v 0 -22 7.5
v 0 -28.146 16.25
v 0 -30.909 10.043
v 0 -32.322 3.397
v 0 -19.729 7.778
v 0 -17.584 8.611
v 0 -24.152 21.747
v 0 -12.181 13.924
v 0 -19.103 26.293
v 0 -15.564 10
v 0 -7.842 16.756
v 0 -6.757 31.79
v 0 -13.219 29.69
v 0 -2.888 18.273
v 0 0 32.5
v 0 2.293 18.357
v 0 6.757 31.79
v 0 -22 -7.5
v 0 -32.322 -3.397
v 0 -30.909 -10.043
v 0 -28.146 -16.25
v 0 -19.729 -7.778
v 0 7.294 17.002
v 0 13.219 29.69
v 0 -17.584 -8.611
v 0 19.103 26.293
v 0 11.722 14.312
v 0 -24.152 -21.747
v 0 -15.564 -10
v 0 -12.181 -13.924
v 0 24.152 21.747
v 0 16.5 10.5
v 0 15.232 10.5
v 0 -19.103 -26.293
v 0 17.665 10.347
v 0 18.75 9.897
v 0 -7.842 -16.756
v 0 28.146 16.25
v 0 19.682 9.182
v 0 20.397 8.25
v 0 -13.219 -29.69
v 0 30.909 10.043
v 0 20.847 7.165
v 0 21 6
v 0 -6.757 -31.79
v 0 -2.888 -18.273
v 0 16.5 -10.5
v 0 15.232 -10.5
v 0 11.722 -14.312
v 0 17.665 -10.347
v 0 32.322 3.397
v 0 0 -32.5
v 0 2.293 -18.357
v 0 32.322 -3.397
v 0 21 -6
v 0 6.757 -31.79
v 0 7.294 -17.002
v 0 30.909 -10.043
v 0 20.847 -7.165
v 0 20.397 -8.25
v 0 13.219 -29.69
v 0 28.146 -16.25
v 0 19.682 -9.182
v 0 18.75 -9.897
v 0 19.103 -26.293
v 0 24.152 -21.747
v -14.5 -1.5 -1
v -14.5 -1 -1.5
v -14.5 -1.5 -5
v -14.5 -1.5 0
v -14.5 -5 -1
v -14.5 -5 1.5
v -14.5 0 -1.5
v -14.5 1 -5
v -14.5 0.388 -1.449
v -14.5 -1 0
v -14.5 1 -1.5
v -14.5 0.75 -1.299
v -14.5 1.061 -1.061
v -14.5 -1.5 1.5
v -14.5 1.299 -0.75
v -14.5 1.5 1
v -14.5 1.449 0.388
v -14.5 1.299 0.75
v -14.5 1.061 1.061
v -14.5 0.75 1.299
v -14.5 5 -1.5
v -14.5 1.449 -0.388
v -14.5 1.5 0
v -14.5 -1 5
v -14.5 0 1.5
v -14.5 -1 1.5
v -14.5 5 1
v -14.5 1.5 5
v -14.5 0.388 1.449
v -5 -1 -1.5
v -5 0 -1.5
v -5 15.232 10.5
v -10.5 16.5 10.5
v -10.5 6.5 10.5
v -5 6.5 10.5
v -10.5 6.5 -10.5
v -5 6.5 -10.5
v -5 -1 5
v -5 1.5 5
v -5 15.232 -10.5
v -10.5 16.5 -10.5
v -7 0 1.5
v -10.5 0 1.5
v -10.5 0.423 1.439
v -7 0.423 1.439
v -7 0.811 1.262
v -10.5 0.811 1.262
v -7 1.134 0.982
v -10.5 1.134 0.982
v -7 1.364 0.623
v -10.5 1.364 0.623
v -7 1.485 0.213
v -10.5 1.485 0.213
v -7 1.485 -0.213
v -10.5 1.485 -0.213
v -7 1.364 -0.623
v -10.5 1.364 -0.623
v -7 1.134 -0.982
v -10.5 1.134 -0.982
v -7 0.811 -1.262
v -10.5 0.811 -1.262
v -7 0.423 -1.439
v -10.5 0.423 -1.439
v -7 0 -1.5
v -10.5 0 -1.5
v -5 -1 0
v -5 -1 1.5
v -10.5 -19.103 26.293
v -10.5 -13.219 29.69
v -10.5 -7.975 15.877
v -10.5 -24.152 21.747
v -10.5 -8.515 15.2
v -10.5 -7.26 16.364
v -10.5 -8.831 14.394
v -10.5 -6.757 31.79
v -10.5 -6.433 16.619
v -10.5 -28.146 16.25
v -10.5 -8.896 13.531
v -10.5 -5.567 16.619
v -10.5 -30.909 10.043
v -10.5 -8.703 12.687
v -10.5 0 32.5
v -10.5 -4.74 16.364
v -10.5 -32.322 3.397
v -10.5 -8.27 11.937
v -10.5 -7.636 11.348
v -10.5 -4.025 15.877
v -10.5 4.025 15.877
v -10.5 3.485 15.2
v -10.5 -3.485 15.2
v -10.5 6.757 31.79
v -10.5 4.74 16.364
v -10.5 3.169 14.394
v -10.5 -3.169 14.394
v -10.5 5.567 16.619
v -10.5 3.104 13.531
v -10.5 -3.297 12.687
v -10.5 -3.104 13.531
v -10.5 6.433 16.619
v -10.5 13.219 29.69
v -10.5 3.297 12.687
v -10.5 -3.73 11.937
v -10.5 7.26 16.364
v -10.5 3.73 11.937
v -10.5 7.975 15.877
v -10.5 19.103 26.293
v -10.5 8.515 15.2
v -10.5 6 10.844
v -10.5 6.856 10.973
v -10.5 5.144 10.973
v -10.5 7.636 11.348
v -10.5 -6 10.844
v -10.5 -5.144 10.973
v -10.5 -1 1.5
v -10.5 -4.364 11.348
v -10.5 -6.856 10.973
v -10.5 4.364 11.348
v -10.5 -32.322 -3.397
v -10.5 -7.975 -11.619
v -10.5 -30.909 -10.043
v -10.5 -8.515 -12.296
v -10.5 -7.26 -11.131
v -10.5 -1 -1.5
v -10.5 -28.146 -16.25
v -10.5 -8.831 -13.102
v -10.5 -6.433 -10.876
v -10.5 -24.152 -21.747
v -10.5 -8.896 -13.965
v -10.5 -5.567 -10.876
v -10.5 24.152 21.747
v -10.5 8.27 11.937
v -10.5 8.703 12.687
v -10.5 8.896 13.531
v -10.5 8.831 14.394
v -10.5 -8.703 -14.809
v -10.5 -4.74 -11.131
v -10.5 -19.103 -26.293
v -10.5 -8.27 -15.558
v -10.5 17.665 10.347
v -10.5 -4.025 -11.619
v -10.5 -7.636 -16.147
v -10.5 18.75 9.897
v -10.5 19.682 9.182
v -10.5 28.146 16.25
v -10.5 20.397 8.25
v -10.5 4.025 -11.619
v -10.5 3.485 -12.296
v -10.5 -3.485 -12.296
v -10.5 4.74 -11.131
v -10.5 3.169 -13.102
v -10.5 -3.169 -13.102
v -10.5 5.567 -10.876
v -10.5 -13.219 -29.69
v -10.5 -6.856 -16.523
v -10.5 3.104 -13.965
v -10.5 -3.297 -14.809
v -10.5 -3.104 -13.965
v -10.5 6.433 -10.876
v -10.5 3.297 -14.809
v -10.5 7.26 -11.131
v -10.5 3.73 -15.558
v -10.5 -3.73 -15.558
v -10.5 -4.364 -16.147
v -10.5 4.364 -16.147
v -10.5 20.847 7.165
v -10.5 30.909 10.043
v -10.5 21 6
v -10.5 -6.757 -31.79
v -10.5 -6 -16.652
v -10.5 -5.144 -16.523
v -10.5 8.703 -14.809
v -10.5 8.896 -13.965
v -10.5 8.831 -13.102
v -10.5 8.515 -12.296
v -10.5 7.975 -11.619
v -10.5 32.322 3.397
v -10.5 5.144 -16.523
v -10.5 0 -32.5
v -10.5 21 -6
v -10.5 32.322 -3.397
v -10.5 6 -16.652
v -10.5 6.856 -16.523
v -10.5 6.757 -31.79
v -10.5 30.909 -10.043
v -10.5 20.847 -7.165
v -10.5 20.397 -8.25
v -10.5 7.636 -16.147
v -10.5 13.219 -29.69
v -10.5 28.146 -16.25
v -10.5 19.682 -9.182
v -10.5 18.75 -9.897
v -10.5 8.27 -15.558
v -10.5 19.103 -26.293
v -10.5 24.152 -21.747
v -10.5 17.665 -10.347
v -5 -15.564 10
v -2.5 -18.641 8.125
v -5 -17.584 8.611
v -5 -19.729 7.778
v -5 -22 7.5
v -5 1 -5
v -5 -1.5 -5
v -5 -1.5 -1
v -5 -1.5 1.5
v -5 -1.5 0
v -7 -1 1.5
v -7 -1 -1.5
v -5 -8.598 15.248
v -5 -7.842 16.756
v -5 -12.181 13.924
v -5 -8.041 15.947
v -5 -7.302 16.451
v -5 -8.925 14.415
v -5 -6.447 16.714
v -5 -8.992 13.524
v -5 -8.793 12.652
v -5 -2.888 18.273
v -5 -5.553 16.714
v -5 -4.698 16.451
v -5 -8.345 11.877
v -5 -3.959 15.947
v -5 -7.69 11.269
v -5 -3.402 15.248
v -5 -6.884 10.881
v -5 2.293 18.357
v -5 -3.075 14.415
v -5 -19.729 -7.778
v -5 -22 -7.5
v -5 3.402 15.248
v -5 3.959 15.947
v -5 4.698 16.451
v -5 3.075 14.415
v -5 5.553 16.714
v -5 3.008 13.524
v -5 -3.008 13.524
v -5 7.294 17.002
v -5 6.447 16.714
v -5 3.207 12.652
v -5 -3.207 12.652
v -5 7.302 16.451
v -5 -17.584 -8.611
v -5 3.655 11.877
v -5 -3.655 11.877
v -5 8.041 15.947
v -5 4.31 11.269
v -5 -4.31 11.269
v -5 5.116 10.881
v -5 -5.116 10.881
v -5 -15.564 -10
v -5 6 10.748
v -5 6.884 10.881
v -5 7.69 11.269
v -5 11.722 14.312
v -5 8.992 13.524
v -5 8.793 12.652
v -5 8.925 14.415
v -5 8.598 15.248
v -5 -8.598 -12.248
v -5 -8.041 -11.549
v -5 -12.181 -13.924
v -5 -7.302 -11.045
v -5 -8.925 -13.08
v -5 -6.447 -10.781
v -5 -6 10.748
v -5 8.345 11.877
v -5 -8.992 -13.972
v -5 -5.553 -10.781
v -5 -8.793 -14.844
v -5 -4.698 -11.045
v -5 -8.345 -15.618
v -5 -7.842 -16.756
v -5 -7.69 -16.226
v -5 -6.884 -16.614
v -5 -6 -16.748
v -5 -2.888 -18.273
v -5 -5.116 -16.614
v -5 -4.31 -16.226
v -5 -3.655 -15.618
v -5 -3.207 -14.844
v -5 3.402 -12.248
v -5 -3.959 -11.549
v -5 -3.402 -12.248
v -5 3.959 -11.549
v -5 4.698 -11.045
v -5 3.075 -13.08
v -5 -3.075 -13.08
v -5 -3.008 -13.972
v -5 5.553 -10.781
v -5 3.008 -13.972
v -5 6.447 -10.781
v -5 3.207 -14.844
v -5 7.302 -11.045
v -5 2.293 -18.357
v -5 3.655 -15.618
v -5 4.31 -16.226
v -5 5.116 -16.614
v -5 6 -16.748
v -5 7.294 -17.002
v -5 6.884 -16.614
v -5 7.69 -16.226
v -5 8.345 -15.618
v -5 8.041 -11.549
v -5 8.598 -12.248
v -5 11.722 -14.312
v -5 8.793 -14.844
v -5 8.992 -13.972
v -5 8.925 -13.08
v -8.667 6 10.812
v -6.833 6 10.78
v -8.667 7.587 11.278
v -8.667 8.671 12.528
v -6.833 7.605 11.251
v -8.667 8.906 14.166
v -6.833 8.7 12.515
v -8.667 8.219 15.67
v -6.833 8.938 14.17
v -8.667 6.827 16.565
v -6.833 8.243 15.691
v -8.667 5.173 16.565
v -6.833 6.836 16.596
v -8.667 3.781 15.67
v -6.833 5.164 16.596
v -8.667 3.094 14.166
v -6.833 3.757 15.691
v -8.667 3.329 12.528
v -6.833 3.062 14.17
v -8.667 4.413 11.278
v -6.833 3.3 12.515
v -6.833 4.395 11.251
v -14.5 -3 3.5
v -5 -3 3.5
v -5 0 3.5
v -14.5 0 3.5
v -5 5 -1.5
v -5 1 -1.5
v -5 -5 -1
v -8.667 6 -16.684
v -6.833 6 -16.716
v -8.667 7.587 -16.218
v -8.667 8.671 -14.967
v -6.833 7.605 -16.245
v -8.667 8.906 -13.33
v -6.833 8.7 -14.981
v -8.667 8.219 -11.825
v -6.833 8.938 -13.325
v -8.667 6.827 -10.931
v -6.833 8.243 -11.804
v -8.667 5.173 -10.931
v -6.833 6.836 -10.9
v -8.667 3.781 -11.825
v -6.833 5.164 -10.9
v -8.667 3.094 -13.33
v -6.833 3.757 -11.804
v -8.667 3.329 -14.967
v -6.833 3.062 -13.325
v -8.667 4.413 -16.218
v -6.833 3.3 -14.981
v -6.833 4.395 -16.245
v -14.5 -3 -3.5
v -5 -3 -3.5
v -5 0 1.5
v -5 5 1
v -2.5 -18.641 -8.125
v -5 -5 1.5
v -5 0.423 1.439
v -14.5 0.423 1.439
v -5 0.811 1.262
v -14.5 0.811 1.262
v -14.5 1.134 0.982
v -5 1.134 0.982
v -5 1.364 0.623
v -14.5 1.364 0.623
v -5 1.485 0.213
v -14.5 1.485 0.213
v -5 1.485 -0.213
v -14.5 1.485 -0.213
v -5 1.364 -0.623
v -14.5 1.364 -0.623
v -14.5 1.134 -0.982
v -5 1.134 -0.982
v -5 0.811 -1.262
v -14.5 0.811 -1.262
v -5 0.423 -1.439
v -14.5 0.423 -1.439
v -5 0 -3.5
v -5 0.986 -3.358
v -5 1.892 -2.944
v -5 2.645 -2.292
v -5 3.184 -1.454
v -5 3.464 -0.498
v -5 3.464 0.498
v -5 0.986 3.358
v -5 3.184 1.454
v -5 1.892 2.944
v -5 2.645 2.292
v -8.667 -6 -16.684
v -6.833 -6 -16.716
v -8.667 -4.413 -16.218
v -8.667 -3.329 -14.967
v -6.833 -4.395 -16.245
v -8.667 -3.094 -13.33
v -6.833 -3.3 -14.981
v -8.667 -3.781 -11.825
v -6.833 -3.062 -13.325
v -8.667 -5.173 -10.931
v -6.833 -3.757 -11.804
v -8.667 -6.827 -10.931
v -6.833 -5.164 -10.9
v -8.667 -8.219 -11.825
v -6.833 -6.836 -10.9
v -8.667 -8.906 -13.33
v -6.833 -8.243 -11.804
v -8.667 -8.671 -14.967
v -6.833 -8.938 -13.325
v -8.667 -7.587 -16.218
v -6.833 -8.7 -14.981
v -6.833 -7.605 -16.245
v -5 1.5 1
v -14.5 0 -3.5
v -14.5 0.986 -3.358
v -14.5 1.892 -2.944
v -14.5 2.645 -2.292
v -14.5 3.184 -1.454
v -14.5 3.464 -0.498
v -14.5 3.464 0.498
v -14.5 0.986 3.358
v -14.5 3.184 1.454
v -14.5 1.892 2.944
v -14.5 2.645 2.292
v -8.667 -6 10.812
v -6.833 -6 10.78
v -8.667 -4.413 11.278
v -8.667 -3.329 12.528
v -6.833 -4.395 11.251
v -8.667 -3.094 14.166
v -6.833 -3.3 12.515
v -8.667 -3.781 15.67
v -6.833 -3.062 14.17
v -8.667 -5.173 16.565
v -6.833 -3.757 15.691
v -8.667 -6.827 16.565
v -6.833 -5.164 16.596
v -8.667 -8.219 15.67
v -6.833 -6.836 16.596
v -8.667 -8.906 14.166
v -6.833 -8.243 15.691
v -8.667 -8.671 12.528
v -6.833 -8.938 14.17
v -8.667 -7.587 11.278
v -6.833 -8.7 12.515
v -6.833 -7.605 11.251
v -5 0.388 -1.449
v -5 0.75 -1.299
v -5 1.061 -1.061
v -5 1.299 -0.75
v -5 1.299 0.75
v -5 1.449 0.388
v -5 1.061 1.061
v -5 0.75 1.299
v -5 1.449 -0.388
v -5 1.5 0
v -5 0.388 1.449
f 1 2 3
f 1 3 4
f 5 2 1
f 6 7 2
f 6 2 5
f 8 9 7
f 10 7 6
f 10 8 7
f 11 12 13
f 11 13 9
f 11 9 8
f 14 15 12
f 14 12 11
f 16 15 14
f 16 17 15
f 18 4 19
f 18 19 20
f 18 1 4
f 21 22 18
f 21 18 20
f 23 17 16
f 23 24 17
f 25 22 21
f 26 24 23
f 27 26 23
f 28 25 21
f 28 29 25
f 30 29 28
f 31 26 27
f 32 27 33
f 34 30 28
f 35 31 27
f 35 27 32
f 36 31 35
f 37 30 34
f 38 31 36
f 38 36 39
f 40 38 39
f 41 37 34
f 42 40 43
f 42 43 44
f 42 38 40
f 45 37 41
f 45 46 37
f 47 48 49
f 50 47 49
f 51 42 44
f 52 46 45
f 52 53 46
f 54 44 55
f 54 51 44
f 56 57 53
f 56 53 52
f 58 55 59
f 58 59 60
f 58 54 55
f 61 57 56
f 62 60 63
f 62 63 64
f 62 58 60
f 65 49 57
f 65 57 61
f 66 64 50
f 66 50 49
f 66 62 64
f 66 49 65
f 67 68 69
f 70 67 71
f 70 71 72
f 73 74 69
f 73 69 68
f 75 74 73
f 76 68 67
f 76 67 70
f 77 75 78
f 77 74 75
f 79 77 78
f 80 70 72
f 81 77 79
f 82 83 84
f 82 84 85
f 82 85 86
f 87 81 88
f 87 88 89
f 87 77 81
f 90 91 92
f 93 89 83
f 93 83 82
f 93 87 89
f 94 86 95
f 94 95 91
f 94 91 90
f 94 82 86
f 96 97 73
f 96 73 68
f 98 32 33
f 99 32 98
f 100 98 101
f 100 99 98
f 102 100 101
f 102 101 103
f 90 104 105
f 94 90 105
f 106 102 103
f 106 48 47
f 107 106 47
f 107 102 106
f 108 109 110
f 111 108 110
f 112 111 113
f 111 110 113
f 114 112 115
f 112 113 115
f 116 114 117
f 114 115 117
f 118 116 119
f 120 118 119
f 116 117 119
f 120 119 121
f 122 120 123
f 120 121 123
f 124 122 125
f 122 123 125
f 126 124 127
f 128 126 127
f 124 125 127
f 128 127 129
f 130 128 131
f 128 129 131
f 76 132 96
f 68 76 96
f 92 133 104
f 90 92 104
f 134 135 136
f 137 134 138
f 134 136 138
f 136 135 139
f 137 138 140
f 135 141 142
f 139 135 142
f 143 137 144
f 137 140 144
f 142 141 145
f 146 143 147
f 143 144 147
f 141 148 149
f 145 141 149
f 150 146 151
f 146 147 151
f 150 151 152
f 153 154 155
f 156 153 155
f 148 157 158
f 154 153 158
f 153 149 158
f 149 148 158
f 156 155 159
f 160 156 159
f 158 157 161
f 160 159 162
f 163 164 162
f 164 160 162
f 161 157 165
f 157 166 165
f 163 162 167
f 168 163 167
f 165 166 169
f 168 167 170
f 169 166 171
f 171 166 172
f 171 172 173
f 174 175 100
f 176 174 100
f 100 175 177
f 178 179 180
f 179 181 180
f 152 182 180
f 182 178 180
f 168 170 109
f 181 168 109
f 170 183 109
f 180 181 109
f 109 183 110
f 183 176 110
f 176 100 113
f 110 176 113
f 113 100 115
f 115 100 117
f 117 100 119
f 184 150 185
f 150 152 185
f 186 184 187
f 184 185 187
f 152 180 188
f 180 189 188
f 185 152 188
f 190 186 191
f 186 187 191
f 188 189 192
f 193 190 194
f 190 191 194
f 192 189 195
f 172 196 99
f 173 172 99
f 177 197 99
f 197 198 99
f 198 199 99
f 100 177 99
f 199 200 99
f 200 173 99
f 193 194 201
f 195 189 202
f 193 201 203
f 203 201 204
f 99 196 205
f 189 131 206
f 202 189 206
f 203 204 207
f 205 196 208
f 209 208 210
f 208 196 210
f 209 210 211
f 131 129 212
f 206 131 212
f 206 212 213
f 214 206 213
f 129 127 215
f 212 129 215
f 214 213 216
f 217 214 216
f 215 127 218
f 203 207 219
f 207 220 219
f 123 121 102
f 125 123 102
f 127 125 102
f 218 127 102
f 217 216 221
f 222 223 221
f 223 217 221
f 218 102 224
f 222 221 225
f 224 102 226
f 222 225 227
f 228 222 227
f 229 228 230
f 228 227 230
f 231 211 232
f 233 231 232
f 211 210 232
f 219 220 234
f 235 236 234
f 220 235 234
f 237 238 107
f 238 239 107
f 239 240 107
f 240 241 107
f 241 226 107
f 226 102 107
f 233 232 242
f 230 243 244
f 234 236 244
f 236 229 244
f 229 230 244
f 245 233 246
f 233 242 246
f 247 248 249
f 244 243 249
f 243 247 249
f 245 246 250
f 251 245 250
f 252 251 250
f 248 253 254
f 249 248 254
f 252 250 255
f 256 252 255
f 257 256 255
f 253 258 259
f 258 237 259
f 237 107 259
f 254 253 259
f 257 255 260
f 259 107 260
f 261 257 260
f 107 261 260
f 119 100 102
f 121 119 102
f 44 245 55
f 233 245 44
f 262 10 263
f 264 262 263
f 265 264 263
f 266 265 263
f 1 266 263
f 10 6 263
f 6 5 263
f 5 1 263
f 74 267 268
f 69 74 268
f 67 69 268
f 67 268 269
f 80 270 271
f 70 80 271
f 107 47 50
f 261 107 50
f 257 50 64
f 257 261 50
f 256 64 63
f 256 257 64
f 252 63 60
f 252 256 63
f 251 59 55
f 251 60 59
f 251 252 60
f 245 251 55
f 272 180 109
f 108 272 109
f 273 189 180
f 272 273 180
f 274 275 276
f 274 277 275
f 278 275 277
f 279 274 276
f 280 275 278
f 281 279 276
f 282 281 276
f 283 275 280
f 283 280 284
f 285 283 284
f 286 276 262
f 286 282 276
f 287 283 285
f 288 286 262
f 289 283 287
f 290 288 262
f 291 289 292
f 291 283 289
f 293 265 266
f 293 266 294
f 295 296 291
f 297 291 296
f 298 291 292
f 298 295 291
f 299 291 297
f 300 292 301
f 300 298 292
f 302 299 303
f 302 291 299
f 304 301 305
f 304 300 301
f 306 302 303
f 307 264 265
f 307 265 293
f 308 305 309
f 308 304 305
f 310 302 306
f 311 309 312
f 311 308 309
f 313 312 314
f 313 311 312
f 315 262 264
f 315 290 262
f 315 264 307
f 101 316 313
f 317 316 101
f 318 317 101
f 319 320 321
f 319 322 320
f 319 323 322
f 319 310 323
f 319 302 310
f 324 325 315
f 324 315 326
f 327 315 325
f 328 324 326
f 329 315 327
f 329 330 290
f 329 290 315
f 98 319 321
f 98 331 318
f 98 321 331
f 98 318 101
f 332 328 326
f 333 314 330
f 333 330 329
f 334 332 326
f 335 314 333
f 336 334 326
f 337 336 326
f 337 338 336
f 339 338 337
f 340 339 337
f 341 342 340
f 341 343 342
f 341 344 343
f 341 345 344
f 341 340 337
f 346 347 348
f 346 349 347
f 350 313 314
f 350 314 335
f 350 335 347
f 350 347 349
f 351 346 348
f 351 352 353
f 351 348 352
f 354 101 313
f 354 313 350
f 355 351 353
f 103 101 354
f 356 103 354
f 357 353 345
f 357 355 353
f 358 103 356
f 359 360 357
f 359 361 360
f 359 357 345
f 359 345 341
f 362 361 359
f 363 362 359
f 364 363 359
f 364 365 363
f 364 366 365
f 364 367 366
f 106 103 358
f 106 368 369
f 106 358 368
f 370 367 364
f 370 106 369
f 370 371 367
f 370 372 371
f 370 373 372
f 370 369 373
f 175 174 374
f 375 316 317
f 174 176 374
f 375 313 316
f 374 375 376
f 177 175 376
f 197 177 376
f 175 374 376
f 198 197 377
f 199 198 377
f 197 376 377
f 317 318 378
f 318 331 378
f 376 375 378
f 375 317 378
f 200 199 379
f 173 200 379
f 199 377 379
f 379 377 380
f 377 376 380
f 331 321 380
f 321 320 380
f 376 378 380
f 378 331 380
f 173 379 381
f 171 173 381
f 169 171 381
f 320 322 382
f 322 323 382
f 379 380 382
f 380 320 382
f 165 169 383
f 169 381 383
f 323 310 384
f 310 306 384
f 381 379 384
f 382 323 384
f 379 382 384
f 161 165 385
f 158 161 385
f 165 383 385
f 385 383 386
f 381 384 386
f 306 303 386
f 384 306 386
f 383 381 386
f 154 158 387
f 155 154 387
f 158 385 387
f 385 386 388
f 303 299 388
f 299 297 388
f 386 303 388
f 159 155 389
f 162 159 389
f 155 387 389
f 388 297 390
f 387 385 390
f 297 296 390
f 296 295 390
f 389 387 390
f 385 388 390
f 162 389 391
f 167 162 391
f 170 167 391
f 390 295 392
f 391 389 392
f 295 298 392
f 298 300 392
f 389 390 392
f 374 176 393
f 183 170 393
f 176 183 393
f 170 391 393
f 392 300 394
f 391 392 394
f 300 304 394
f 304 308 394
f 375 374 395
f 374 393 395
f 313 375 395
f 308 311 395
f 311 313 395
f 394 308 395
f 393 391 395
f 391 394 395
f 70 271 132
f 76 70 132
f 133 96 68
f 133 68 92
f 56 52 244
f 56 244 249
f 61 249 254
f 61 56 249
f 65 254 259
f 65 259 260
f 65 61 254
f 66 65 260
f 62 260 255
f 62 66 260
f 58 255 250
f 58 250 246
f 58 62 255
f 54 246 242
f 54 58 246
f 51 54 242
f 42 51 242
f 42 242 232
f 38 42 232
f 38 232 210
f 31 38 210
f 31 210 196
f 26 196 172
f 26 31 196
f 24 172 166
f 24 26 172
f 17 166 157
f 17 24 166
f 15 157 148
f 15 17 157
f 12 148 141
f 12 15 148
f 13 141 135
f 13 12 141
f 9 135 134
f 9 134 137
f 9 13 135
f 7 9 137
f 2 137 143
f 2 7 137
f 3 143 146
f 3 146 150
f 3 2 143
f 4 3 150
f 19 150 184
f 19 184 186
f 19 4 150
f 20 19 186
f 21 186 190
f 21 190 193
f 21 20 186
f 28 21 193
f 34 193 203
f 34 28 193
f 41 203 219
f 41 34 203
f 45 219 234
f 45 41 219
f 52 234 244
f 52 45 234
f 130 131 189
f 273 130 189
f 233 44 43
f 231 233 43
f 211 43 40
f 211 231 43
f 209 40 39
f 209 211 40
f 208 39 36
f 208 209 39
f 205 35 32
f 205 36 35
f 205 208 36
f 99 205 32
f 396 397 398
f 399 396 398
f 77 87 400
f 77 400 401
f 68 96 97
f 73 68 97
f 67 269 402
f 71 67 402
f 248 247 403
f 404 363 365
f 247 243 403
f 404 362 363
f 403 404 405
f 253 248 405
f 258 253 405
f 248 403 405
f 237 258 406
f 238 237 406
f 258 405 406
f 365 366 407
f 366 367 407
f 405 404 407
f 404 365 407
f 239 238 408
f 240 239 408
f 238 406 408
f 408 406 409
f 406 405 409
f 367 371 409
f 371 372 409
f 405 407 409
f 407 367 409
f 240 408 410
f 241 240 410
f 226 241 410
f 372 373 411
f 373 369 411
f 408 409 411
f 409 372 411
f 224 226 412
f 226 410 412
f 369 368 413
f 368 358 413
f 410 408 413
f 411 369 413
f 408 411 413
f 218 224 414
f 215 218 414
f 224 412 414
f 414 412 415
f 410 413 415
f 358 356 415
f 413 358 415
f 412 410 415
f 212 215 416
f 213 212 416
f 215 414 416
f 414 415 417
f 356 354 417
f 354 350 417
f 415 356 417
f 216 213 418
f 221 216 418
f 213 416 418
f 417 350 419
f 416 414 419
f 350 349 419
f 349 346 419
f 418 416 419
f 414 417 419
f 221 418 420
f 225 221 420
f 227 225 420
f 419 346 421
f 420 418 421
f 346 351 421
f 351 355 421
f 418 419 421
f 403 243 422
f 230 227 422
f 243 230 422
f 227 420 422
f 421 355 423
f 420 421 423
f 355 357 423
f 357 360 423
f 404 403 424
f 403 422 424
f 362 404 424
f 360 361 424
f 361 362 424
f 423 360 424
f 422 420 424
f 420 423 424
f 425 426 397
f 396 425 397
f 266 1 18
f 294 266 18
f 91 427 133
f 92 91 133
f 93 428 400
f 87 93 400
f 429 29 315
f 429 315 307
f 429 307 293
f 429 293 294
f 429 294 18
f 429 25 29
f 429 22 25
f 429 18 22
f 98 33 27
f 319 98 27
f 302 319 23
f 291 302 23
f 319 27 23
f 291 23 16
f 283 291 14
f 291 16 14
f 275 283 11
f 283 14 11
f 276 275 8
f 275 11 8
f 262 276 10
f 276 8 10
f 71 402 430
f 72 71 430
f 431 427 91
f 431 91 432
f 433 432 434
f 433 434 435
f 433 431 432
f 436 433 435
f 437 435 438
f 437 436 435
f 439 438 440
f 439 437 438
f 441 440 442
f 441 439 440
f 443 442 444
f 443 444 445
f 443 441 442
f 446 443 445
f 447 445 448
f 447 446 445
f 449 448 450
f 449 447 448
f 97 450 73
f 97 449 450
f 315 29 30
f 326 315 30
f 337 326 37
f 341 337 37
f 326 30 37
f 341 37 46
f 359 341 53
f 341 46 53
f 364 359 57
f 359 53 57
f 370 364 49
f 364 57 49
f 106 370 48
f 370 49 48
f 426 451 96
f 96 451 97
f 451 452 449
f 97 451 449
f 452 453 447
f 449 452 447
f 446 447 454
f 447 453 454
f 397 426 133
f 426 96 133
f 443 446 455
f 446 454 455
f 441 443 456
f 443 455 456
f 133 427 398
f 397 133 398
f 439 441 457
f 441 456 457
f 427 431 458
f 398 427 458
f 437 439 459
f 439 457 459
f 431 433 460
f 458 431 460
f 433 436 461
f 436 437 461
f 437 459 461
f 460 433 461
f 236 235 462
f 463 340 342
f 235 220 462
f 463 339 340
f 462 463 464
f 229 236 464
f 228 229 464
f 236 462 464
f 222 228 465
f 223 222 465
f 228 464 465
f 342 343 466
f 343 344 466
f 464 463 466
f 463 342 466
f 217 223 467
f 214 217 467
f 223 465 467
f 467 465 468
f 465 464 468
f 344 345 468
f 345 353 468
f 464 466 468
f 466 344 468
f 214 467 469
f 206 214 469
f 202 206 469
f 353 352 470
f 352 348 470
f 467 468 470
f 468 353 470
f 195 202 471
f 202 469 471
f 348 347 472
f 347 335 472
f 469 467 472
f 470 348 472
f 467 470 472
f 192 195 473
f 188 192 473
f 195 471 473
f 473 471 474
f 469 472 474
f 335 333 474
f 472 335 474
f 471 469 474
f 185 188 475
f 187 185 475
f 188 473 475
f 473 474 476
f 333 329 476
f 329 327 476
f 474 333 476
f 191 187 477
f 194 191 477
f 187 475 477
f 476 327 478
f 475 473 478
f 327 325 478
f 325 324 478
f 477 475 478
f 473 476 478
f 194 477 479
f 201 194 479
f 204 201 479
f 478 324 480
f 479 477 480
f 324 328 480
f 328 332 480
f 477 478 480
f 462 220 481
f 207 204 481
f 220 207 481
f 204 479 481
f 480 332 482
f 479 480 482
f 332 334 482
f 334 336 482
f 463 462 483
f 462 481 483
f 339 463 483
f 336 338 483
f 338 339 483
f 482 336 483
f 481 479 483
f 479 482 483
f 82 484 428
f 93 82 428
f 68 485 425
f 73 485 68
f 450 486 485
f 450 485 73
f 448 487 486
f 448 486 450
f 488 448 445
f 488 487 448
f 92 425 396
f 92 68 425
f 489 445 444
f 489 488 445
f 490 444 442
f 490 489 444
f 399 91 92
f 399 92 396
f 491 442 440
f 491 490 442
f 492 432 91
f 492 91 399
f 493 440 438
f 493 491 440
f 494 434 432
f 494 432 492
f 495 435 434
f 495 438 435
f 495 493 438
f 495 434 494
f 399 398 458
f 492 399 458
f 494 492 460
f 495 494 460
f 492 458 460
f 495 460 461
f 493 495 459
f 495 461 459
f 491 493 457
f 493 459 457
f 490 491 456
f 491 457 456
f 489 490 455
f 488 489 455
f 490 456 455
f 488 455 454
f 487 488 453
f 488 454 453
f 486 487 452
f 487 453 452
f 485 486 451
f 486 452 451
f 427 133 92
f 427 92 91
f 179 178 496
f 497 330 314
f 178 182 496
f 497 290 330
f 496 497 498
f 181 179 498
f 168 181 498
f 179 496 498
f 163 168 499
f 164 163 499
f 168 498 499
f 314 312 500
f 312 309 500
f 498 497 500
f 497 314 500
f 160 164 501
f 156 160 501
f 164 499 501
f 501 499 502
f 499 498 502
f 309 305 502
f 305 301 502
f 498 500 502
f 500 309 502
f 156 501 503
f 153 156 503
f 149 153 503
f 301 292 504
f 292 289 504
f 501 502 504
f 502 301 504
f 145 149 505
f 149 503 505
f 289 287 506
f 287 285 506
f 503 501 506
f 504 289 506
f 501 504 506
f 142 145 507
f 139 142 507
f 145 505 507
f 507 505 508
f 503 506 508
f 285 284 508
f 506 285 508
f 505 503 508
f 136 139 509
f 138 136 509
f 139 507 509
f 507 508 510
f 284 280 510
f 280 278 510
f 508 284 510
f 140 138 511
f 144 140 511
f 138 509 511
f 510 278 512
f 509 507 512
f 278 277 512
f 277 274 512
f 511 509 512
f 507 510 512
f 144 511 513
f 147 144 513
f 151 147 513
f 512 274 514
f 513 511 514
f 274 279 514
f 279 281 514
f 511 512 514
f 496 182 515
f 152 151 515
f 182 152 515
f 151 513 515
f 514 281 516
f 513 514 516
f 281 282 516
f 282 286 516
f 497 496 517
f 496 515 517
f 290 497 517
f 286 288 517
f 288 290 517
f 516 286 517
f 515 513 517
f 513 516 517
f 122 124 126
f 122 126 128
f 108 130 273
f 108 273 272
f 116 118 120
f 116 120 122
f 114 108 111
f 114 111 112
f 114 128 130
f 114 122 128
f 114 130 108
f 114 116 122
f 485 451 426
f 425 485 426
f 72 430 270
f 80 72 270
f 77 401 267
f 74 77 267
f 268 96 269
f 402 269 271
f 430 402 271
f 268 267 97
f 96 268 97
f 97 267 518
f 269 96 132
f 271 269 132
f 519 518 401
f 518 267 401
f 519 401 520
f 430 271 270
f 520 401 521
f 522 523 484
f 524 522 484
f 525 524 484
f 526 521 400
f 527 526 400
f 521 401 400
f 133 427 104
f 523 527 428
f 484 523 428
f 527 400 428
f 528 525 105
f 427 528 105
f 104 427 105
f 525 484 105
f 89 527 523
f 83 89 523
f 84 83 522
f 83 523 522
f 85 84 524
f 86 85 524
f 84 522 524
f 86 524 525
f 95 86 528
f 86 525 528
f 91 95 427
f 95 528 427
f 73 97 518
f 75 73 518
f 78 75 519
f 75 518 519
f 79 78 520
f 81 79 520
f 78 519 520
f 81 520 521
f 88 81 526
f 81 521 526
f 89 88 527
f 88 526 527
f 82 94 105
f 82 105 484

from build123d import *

# Parameters (mm, degrees)
SKETCH2_R                    = 32.5
BOSS_EXTRUDE1_DEPTH          = 10.5
CUT_EXTRUDE1_DEPTH           = 5
CUT_EXTRUDE2_DEPTH           = 10
CUT_EXTRUDE2_DEPTH_BACK      = 47.289847839
SKETCH4_3_R                  = 3
CUT_EXTRUDE4_DEPTH           = 5.5
CUT_EXTRUDE4_DRAFT           = -1
CUT_EXTRUDE4_PROFILE_2_DEPTH = 5.5
CUT_EXTRUDE4_PROFILE_2_DRAFT = -1
CUT_EXTRUDE4_PROFILE_3_DEPTH = 5.5
CUT_EXTRUDE4_PROFILE_3_DRAFT = -1
CUT_EXTRUDE4_PROFILE_4_DEPTH = 5.5
CUT_EXTRUDE4_PROFILE_4_DRAFT = -1
EXTRUDE_THIN1_DEPTH          = 4
EXTRUDE_THIN1_DEPTH_BACK     = 5.5
BOSS_EXTRUDE8_DEPTH          = 4
BOSS_EXTRUDE8_DEPTH_BACK     = 5.5
CUT_EXTRUDE5_DEPTH           = 3.5


with BuildPart() as part:
    # Sketch2 → Boss-Extrude1 (new body)
    with BuildSketch(Plane(origin=(0, 0, 0), x_dir=(0, 0, -1), z_dir=(1, 0, 0))):
        Circle(SKETCH2_R)
    extrude(amount=-BOSS_EXTRUDE1_DEPTH)

    # Sketch3 → Cut-Extrude1 (cut)
    with BuildSketch(Plane(origin=(0, 0, 0), x_dir=(0, 0, -1), z_dir=(1, 0, 0))):
        with BuildLine():
            add(Edge.make_bspline(
                [(-10, -15.564382416), (-7.5, -18.5), (-7.5, -22)],
                knots=[0, 0, 0, 1, 1, 1], degree=2))
            Line((-7.5, -22), (7.5, -22))
            add(Edge.make_bspline(
                [(10, -15.564382416), (7.5, -18.5), (7.5, -22)],
                knots=[0, 0, 0, 1, 1, 1], degree=2))
            ThreePointArc((10, -15.564382416), (0, 18.5), (-10, -15.564382416))
        make_face()
    extrude(amount=-CUT_EXTRUDE1_DEPTH, mode=Mode.SUBTRACT)

    # Sketch4 → Cut-Extrude2 (cut, two sides: drawn at the far end of the back side and taken through both)
    with BuildSketch(Plane(origin=(-5, 0, 0), x_dir=(0, 0, -1), z_dir=(1, 0, 0)).offset(-CUT_EXTRUDE2_DEPTH_BACK)):
        with BuildLine():
            ThreePointArc((-6, 21), (-9.181980515, 19.681980515), (-10.5, 16.5))
            Line((-10.5, 16.5), (-10.5, 6.5))
            Line((-10.5, 6.5), (10.5, 6.5))
            Line((10.5, 6.5), (10.5, 16.5))
            ThreePointArc((10.5, 16.5), (9.181980515, 19.681980515), (6, 21))
            Line((6, 21), (-6, 21))
        make_face()
    extrude(amount=CUT_EXTRUDE2_DEPTH + CUT_EXTRUDE2_DEPTH_BACK, mode=Mode.SUBTRACT)


with BuildPart() as cut_extrude4_tool:
    # Sketch4<3> → Cut-Extrude4 (with draft: the straight prism first)
    with BuildSketch(Plane(origin=(-5, 0, 0), x_dir=(0, 0, -1), z_dir=(1, 0, 0))):
        with Locations((13.747727085, 6)):
            Circle(SKETCH4_3_R)
    extrude(amount=-CUT_EXTRUDE4_DEPTH)
    # Cut-Extrude4: the draft: its side faces are tilted about the plane it starts from
    cut_extrude4_sides = [cut_extrude4_tool.faces().sort_by_distance(p)[0] for p in [
        (-7.75, 6, -10.747727085),
    ]]
    draft(cut_extrude4_sides, Plane(origin=(-5, 0, 0), x_dir=(0, 0, -1), z_dir=(1, 0, 0)), CUT_EXTRUDE4_DRAFT)


with BuildPart() as part_1:
    add(part.part)

    # Cut-Extrude4: cut by cut_extrude4_tool
    add(cut_extrude4_tool.part, mode=Mode.SUBTRACT)


with BuildPart() as cut_extrude4_profile_2_tool:
    # Sketch4<3> → Cut-Extrude4 profile 2 (with draft: the straight prism first)
    with BuildSketch(Plane(origin=(-5, 0, 0), x_dir=(0, 0, -1), z_dir=(1, 0, 0))):
        with Locations((13.747727085, -6)):
            Circle(SKETCH4_3_R)
    extrude(amount=-CUT_EXTRUDE4_PROFILE_2_DEPTH)
    # Cut-Extrude4 profile 2: the draft: its side faces are tilted about the plane it starts from
    cut_extrude4_profile_2_sides = [cut_extrude4_profile_2_tool.faces().sort_by_distance(p)[0] for p in [
        (-7.75, -6, -10.747727085),
    ]]
    draft(cut_extrude4_profile_2_sides, Plane(origin=(-5, 0, 0), x_dir=(0, 0, -1), z_dir=(1, 0, 0)), CUT_EXTRUDE4_PROFILE_2_DRAFT)


with BuildPart() as part_2:
    add(part_1.part)

    # Cut-Extrude4 profile 2: cut by cut_extrude4_profile_2_tool
    add(cut_extrude4_profile_2_tool.part, mode=Mode.SUBTRACT)


with BuildPart() as cut_extrude4_profile_3_tool:
    # Sketch4<3> → Cut-Extrude4 profile 3 (with draft: the straight prism first)
    with BuildSketch(Plane(origin=(-5, 0, 0), x_dir=(0, 0, -1), z_dir=(1, 0, 0))):
        with Locations((-13.747727085, 6)):
            Circle(SKETCH4_3_R)
    extrude(amount=-CUT_EXTRUDE4_PROFILE_3_DEPTH)
    # Cut-Extrude4 profile 3: the draft: its side faces are tilted about the plane it starts from
    cut_extrude4_profile_3_sides = [cut_extrude4_profile_3_tool.faces().sort_by_distance(p)[0] for p in [
        (-7.75, 6, 16.747727085),
    ]]
    draft(cut_extrude4_profile_3_sides, Plane(origin=(-5, 0, 0), x_dir=(0, 0, -1), z_dir=(1, 0, 0)), CUT_EXTRUDE4_PROFILE_3_DRAFT)


with BuildPart() as part_3:
    add(part_2.part)

    # Cut-Extrude4 profile 3: cut by cut_extrude4_profile_3_tool
    add(cut_extrude4_profile_3_tool.part, mode=Mode.SUBTRACT)


with BuildPart() as cut_extrude4_profile_4_tool:
    # Sketch4<3> → Cut-Extrude4 profile 4 (with draft: the straight prism first)
    with BuildSketch(Plane(origin=(-5, 0, 0), x_dir=(0, 0, -1), z_dir=(1, 0, 0))):
        with Locations((-13.747727085, -6)):
            Circle(SKETCH4_3_R)
    extrude(amount=-CUT_EXTRUDE4_PROFILE_4_DEPTH)
    # Cut-Extrude4 profile 4: the draft: its side faces are tilted about the plane it starts from
    cut_extrude4_profile_4_sides = [cut_extrude4_profile_4_tool.faces().sort_by_distance(p)[0] for p in [
        (-7.75, -6, 16.747727085),
    ]]
    draft(cut_extrude4_profile_4_sides, Plane(origin=(-5, 0, 0), x_dir=(0, 0, -1), z_dir=(1, 0, 0)), CUT_EXTRUDE4_PROFILE_4_DRAFT)


with BuildPart() as part_4:
    add(part_3.part)

    # Cut-Extrude4 profile 4: cut by cut_extrude4_profile_4_tool
    add(cut_extrude4_profile_4_tool.part, mode=Mode.SUBTRACT)

    # Sketch10 → Cut-Extrude5 (cut)
    with BuildSketch(Plane.ZY.offset(10.5)):
        with BuildLine():
            Line((1.5, -1), (1.5, 0))
            ThreePointArc((1.5, 0), (0, 1.5), (-1.5, 0))
            Line((-1.5, 0), (-1.5, -1))
            Line((-1.5, -1), (1.5, -1))
        make_face()
    extrude(amount=-CUT_EXTRUDE5_DEPTH, mode=Mode.SUBTRACT)


with BuildPart() as body_2:
    # Sketch5 → Extrude-Thin1 (new, two sides: drawn at the far end of the back side and taken through both)
    with BuildSketch(Plane.ZY.offset(10.5).offset(-EXTRUDE_THIN1_DEPTH_BACK)):
        with BuildLine():
            Line((-3.5, 0), (-3.5, -3))
            Line((-3.5, -3), (3.5, -3))
            Line((3.5, -3), (3.5, 0))
            ThreePointArc((3.5, 0), (0, 3.5), (-3.5, 0))
        make_face()
        with BuildLine():
            Line((-1.5, 0), (-1.5, -1))
            Line((-1.5, -1), (1.5, -1))
            Line((1.5, -1), (1.5, 0))
            ThreePointArc((1.5, 0), (0, 1.5), (-1.5, 0))
        make_face(mode=Mode.SUBTRACT)
    extrude(amount=EXTRUDE_THIN1_DEPTH + EXTRUDE_THIN1_DEPTH_BACK)


with BuildPart() as body_3:
    # Sketch5<4> → Boss-Extrude8 (new, two sides: drawn at the far end of the back side and taken through both)
    with BuildSketch(Plane.ZY.offset(10.5).offset(-BOSS_EXTRUDE8_DEPTH_BACK)):
        Polygon((-1.5, -1), (-1.5, 0), (-1.5, 1), (-5, 1), (-5, -1.5), (-1, -1.5), (0, -1.5), (0, -1), align=None)
        with BuildLine():
            Line((-1.5, 1), (-1.5, 0))
            ThreePointArc((-1.5, 0), (-1.060660172, 1.060660172), (0, 1.5))
            Line((0, 1.5), (1, 1.5))
            Line((1, 1.5), (1, 5))
            Line((1, 5), (-1.5, 5))
            Line((-1.5, 5), (-1.5, 1))
        make_face()
        with BuildLine():
            Line((1, 1.5), (0, 1.5))
            ThreePointArc((0, 1.5), (1.060660172, 1.060660172), (1.5, 0))
            Line((1.5, 0), (1.5, -1))
            Line((1.5, -1), (5, -1))
            Line((5, -1), (5, 1.5))
            Line((5, 1.5), (1, 1.5))
        make_face()
        Polygon((1.5, -1.5), (0, -1.5), (-1, -1.5), (-1, -5), (1.5, -5), align=None)
    extrude(amount=BOSS_EXTRUDE8_DEPTH + BOSS_EXTRUDE8_DEPTH_BACK)


solid = Compound([part_4.part, body_2.part, body_3.part])
